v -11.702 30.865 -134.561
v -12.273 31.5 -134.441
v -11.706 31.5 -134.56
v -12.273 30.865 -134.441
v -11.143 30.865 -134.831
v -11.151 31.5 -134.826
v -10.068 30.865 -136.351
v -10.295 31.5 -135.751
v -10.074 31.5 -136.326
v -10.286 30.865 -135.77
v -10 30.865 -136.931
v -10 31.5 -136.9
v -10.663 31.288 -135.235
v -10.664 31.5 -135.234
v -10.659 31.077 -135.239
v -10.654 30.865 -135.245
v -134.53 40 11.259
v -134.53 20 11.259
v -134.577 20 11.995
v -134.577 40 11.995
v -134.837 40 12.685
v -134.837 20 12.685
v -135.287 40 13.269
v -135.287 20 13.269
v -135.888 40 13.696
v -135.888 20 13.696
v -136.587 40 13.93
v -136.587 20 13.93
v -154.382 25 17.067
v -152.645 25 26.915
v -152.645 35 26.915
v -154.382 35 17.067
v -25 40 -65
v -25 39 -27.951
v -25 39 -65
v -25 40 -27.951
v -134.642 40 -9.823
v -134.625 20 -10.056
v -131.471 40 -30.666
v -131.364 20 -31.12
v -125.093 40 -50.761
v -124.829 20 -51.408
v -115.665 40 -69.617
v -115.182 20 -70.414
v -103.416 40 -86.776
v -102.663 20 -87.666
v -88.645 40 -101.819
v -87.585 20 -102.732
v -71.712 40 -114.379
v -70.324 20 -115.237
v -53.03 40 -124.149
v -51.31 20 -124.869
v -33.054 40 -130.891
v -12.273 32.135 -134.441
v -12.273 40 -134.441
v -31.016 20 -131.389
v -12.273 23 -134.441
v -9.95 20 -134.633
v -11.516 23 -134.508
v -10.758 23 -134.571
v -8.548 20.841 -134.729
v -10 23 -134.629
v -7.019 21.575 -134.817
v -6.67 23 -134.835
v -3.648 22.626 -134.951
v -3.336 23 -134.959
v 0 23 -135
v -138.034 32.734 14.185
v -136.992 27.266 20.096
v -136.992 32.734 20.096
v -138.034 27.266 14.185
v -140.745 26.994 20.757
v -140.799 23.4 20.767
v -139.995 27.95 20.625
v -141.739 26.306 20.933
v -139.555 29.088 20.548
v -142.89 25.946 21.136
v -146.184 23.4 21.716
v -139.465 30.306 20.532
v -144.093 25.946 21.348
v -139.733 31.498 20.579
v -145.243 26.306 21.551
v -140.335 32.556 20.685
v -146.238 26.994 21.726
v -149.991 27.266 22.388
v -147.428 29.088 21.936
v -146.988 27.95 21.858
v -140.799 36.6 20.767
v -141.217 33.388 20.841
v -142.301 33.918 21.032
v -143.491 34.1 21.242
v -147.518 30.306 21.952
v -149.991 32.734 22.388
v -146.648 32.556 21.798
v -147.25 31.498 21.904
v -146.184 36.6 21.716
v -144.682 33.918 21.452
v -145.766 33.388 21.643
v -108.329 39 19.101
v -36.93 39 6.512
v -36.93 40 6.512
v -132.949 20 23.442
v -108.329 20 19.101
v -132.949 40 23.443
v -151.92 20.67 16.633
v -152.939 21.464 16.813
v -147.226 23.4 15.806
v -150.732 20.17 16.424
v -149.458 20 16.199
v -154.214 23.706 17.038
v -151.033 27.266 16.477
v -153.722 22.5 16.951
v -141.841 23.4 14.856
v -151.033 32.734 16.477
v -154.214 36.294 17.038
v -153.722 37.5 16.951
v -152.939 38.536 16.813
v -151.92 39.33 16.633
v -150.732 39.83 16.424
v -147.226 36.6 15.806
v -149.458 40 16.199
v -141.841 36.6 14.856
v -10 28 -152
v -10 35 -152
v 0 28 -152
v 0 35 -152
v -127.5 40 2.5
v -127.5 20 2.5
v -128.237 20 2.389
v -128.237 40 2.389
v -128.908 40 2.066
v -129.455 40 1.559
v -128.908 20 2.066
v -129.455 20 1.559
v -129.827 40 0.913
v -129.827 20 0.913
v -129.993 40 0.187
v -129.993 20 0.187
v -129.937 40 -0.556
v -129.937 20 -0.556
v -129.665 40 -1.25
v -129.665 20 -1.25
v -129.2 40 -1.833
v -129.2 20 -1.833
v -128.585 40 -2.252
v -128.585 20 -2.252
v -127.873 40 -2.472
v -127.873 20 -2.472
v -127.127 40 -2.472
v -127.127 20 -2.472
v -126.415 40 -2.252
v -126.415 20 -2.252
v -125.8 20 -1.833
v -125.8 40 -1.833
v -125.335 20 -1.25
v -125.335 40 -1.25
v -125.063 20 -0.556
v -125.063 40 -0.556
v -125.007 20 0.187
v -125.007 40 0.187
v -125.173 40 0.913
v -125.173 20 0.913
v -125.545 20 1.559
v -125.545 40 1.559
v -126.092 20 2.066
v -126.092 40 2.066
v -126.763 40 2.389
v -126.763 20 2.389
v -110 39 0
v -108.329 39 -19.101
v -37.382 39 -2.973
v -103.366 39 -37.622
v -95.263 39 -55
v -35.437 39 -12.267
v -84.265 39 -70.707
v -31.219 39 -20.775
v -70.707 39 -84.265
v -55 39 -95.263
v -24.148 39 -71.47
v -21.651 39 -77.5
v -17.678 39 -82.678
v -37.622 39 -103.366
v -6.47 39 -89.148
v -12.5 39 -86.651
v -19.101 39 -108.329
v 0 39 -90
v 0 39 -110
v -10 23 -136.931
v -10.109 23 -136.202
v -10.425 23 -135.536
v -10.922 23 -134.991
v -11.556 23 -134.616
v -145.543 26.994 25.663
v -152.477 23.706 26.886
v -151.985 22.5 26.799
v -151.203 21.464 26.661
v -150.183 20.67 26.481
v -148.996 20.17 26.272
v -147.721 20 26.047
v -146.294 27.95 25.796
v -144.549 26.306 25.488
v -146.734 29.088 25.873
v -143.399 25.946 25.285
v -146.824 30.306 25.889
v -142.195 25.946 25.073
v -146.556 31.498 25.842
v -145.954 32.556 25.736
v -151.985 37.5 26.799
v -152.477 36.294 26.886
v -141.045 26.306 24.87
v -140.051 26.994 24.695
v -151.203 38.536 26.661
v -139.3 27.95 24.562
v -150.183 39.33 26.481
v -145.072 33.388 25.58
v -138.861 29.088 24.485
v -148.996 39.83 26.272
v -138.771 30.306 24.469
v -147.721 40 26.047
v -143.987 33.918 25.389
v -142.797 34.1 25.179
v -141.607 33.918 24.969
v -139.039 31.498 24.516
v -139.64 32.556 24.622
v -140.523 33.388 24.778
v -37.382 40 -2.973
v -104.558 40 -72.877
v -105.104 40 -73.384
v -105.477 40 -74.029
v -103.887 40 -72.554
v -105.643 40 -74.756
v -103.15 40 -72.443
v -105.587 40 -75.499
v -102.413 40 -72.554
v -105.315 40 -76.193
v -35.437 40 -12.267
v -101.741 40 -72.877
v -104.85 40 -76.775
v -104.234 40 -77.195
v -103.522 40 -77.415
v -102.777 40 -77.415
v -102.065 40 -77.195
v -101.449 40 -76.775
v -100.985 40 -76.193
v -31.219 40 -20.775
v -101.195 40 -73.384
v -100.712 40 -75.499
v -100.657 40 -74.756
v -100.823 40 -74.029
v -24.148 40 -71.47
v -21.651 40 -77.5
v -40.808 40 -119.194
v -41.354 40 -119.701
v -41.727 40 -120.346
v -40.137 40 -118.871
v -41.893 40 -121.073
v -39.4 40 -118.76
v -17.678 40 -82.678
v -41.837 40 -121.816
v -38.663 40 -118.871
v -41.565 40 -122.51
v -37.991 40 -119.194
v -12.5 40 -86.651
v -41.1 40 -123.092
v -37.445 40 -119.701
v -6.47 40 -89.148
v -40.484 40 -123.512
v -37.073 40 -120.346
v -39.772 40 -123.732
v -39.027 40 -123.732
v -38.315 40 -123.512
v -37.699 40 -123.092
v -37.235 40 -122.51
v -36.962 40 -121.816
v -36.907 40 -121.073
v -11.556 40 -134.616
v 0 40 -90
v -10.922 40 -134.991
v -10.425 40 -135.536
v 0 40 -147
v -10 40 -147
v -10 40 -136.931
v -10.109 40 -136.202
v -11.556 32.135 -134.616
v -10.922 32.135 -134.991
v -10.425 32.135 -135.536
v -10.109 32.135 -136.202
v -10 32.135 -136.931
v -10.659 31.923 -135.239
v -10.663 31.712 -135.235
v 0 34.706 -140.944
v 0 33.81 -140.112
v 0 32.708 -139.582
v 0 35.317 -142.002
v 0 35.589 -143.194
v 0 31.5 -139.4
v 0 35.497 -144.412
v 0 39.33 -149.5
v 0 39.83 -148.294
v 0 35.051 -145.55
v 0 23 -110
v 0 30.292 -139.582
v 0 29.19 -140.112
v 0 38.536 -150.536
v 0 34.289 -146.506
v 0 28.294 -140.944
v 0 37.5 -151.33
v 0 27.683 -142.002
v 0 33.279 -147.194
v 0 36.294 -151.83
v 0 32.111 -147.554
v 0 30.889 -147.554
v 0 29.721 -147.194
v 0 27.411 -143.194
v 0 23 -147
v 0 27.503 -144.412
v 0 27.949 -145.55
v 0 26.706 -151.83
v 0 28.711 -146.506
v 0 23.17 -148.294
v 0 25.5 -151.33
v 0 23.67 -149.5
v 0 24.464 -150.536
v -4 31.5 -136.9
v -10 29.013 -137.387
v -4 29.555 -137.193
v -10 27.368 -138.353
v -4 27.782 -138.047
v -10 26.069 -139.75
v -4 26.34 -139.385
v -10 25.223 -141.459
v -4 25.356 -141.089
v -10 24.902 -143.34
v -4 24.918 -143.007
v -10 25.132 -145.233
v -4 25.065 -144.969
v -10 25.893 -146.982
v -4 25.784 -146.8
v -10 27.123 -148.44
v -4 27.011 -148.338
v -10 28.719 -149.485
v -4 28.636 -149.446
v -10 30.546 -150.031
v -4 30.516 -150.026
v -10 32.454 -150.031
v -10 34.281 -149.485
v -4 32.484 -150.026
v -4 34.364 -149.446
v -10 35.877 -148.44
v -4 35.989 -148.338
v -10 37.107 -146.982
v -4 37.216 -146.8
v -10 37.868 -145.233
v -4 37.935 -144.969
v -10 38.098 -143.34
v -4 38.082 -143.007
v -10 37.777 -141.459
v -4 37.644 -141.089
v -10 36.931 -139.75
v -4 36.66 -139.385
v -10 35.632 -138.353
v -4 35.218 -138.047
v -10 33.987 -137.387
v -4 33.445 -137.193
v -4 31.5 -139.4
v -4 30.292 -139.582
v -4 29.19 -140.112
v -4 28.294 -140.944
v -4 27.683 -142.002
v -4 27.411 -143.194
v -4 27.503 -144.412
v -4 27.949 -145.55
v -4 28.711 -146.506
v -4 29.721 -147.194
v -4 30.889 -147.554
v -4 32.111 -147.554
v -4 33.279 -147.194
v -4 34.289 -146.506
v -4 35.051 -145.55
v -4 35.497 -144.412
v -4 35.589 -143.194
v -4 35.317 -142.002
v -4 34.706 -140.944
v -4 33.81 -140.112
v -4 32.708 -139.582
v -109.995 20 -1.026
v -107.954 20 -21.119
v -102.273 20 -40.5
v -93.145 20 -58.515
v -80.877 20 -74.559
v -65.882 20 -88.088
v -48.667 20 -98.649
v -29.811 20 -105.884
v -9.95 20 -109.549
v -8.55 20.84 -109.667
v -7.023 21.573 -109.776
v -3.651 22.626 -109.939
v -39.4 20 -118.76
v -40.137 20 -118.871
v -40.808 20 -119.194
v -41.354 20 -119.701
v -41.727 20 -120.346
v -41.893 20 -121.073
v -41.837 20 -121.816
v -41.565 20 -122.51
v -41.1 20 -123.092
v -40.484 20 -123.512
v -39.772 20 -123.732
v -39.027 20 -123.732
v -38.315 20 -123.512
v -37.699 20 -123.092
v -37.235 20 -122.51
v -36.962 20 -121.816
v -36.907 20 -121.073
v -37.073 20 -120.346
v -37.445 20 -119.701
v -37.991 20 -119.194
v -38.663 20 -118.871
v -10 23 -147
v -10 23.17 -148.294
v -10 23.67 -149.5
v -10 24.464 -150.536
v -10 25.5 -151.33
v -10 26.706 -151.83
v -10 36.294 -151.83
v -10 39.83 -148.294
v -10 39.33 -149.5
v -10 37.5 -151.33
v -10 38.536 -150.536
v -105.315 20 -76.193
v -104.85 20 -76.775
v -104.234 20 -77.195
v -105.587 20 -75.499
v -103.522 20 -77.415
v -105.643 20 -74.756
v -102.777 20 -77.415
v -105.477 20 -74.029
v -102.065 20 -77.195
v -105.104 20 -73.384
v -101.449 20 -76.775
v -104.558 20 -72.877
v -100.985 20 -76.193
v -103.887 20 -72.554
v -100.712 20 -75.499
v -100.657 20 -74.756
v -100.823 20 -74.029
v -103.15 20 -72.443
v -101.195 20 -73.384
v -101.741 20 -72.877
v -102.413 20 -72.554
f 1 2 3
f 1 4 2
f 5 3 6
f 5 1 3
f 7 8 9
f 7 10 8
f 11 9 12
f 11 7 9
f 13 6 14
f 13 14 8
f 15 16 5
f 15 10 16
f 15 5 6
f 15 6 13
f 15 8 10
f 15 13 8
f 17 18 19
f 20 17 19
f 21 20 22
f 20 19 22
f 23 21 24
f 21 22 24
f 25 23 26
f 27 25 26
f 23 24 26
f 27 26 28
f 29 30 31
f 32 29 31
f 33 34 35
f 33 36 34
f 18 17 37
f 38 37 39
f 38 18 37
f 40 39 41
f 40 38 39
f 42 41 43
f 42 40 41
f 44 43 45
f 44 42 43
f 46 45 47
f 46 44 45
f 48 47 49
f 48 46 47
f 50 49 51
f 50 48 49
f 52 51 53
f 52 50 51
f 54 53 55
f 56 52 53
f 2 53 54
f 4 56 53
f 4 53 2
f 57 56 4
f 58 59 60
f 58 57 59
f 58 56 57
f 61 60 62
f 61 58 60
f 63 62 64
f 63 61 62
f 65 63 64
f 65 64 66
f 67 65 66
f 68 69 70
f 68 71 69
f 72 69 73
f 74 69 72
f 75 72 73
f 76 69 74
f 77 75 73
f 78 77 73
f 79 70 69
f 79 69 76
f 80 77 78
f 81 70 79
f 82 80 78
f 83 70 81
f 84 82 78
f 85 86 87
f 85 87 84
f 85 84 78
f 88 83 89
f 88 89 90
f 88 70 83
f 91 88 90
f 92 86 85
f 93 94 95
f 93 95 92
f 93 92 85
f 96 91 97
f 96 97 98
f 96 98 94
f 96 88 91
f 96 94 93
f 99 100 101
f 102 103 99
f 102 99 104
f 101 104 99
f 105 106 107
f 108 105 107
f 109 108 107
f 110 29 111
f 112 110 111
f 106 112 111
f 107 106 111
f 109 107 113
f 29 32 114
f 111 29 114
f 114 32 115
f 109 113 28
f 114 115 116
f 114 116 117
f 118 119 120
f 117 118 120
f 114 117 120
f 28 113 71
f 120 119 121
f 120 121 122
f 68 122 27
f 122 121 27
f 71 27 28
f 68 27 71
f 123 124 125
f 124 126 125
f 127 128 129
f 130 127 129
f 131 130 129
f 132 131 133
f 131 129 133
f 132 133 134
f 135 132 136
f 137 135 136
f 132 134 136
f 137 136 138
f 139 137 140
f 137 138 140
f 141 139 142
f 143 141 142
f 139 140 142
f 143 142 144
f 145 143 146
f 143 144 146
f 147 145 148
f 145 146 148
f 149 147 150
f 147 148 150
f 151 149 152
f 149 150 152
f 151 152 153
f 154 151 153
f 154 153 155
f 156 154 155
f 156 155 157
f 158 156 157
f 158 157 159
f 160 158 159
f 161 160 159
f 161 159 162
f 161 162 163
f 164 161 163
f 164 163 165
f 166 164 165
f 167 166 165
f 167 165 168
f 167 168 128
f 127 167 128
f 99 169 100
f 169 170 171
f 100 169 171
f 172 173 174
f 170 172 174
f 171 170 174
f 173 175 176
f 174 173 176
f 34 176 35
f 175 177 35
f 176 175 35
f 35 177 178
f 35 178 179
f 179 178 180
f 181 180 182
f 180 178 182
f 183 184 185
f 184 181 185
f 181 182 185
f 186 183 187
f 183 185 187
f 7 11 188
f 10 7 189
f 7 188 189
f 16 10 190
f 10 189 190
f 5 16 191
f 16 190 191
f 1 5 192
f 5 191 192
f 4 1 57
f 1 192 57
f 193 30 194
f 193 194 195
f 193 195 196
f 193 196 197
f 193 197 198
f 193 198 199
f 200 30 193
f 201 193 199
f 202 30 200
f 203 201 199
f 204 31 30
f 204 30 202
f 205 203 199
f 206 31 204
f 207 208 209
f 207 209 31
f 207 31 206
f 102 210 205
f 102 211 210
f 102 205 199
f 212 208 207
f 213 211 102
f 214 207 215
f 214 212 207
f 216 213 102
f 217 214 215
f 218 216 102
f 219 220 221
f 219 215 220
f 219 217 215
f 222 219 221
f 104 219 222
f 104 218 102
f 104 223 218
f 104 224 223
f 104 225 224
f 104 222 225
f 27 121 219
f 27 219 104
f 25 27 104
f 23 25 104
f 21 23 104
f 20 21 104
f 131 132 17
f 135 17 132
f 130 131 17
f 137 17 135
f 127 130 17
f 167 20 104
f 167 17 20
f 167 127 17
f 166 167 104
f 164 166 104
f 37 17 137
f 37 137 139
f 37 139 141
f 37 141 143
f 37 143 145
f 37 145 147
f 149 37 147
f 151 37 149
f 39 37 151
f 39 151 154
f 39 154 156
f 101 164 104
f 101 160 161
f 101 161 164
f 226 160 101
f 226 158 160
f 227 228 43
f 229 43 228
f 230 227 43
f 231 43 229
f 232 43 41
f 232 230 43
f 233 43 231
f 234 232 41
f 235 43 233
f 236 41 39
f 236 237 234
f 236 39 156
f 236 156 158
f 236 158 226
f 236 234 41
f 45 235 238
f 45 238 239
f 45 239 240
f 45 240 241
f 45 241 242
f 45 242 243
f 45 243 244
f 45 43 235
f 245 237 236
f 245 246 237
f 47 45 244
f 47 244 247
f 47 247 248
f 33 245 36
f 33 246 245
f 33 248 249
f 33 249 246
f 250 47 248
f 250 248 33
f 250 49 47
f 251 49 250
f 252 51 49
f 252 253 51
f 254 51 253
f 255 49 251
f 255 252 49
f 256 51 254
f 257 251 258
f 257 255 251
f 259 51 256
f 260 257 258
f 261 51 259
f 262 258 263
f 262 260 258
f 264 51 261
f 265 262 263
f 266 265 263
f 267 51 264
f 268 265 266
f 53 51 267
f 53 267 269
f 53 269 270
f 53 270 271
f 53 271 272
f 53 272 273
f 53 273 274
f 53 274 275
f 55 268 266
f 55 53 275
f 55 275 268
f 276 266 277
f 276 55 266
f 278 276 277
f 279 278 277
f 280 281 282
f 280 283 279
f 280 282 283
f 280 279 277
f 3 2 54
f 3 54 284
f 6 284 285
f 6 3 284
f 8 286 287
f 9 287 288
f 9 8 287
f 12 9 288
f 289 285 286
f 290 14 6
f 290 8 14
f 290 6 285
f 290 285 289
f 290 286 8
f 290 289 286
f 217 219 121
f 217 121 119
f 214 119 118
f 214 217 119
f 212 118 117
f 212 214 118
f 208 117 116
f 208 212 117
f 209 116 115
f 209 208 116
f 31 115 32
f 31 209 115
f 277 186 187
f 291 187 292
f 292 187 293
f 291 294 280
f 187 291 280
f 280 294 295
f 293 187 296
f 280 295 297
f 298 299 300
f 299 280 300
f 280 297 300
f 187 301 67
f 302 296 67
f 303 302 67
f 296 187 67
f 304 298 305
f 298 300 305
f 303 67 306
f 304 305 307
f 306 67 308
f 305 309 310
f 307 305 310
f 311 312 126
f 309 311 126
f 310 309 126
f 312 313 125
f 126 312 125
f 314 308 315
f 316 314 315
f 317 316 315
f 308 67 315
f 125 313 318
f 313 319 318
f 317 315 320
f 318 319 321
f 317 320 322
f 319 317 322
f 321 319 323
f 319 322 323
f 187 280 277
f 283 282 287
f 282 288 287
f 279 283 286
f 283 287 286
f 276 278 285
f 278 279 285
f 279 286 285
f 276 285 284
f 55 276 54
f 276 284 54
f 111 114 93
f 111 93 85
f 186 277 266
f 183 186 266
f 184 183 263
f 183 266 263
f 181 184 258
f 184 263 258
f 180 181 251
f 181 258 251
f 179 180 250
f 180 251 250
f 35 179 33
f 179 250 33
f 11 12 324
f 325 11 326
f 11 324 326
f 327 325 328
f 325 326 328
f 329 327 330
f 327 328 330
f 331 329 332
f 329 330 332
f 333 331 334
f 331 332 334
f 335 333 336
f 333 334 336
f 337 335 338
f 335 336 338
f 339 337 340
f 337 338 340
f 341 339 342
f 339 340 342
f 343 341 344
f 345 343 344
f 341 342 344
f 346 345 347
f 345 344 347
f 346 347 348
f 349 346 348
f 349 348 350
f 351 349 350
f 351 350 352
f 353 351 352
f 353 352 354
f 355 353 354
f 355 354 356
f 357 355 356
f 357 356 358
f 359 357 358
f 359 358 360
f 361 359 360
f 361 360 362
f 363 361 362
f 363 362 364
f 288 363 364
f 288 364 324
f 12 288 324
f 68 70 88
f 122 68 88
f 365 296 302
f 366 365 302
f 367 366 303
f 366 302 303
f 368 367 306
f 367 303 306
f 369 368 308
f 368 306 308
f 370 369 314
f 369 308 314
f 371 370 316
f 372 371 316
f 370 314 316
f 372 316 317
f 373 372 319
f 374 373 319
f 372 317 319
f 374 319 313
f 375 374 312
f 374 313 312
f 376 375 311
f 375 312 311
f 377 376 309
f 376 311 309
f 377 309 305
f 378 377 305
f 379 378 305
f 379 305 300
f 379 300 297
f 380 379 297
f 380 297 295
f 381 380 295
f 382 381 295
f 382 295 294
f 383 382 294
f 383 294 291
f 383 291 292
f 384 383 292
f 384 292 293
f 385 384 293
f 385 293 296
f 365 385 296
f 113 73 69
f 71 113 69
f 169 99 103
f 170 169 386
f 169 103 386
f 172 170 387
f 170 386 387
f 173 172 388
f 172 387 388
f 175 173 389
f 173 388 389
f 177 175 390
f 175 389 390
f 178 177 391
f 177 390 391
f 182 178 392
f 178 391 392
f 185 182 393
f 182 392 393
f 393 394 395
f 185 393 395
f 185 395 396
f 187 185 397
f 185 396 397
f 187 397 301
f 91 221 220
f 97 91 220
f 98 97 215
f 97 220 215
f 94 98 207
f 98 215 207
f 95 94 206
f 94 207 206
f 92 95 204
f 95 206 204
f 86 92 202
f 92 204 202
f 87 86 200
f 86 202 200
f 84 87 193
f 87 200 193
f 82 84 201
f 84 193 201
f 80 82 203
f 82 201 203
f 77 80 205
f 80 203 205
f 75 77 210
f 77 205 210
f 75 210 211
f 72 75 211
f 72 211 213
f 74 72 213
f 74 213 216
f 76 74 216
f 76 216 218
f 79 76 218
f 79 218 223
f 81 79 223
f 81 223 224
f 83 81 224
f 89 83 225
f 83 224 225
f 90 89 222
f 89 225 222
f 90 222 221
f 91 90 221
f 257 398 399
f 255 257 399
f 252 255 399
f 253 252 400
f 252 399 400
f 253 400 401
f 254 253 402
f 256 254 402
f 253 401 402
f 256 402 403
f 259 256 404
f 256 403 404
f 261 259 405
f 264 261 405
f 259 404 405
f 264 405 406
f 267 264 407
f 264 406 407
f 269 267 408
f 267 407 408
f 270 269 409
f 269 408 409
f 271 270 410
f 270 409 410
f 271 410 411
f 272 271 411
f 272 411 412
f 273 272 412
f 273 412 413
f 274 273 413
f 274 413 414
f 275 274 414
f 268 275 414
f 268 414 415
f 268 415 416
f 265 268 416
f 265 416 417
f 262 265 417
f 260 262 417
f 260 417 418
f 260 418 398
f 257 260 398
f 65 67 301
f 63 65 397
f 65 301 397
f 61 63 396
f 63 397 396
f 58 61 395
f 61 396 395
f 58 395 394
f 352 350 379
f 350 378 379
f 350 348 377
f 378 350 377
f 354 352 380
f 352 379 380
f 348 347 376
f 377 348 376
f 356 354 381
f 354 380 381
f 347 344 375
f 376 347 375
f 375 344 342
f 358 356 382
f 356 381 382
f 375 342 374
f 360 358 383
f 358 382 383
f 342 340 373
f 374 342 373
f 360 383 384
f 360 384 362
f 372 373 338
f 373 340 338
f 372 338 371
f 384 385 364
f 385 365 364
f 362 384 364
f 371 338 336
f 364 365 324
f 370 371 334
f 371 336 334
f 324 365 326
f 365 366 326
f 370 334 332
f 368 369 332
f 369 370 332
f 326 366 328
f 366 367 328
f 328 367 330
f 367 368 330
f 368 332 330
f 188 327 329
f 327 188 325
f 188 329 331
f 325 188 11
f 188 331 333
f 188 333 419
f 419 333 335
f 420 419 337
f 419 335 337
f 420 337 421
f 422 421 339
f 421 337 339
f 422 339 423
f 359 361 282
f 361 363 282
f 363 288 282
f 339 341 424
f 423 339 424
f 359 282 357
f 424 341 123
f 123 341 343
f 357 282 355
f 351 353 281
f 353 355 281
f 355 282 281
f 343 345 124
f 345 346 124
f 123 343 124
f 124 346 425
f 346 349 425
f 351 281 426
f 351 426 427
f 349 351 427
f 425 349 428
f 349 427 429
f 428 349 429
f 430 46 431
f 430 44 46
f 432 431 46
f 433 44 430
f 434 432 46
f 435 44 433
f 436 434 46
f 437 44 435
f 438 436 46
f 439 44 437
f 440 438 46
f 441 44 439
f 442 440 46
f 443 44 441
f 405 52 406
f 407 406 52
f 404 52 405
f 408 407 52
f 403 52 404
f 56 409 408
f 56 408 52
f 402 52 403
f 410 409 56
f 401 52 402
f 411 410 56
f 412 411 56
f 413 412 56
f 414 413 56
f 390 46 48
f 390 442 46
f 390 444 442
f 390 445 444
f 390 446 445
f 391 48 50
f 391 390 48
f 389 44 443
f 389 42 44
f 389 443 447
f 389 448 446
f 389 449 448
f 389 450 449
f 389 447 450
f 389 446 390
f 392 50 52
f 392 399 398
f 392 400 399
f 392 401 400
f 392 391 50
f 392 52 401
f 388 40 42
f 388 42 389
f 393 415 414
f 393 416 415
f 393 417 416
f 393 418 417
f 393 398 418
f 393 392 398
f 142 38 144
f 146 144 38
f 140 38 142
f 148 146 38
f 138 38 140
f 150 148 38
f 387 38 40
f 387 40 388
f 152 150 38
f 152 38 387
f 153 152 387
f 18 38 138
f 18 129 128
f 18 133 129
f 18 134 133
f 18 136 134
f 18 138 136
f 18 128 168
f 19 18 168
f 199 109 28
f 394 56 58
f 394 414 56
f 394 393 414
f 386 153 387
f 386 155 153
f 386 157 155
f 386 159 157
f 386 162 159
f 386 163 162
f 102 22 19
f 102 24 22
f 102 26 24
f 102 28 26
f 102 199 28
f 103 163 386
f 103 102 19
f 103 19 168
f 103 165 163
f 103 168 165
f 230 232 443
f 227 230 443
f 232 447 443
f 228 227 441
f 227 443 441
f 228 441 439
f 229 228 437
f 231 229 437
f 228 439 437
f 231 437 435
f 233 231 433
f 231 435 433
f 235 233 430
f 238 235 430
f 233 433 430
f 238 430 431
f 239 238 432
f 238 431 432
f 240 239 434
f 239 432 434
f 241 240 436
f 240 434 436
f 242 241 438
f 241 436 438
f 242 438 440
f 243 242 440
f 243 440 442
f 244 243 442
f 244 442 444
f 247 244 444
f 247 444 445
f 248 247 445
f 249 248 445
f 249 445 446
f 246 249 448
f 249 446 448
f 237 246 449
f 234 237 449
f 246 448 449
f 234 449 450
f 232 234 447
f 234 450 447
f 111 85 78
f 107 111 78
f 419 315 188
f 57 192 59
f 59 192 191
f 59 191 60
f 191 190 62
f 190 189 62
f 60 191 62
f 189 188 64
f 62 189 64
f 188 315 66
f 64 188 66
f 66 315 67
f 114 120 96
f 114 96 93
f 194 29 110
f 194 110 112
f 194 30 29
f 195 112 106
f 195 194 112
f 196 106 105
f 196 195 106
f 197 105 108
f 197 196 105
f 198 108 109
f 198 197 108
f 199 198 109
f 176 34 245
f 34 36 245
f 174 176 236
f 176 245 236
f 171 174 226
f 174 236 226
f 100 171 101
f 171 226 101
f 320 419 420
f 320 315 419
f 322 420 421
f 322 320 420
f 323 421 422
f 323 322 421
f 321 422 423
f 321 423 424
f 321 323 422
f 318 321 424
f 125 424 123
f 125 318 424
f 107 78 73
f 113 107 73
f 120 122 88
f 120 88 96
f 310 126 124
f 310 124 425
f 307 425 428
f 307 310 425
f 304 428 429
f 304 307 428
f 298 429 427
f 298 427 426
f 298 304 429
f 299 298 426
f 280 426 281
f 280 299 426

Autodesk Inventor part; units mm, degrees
ref_plane "YZ Plane" through (0, 0, 0) normal (1, 0, 0) x (0, 1, 0)
ref_plane "XZ Plane" through (0, 0, 0) normal (0, 1, 0) x (-1, 0, 0)
ref_plane "XY Plane" through (0, 0, 0) normal (0, 0, 1) x (1, 0, 0)
sketch "Sketch1" plane through (0, 0, 0) normal (0, 1, 0) x (-1, 0, 0)
  circle A0 centre (0, 0) radius 135
  circle A1 centre (0, 0) radius 110
  dimension "d0" = 270
  dimension "d1" = 220
extrude "Extrusion1" add sketch "Sketch1" along normal blind 55
sketch "Sketch2" plane through (0, 0, 0) normal (0, 0, 1) x (1, 0, 0)
  circle A0 centre (0, 5) radius 18
  line L0 (135, 0) -> (-135, 0) projected
  point P0 (0, 0)
  dimension "d4" = 36
  dimension "d5" = 5
extrude "Extrusion2" cut sketch "Sketch2" against normal through all
sketch "Sketch3" plane through (0, 0, 0) normal (0, -1, 0) x (1, 0, 0)
  circle A0 centre (0, 0) radius 140
extrude "Extrusion3" cut sketch "Sketch3" against normal blind 20
sketch "Sketch4" plane through (0, 20, 0) normal (0, -1, 0) x (1, 0, 0)
  line L0 (0, 0) -> (70, 0)
  line L1 (80, -100) -> (60, -100)
  line L2 (60, -100) -> (60, 100)
  line L3 (60, 100) -> (80, 100)
  line L4 (80, 100) -> (80, -100)
  line L5 (80, -100) -> (60, 100) construction
  line L6 (60, -100) -> (80, 100) construction
  dimension "d10" = 70
  dimension "d11" = 20
  dimension "d12" = 200
extrude "Extrusion4" cut sketch "Sketch4" against normal through all
sketch "Sketch5" plane through (0, 55, 0) normal (0, 1, 0) x (1, 0, 0)
  circle A0 centre (0, 0) radius 127.5
  circle A1 centre (127.5, 0) radius 2
  circle A2 centre (103.1497, 74.9426) radius 2
  circle A3 centre (39.3997, 121.2597) radius 2
  circle A4 centre (-39.3997, 121.2597) radius 2
  circle A5 centre (-103.1497, 74.9426) radius 2
  circle A6 centre (-127.5, 0) radius 2
  circle A7 centre (-103.1497, -74.9426) radius 2
  circle A8 centre (-39.3997, -121.2597) radius 2
  circle A9 centre (39.3997, -121.2597) radius 2
  circle A10 centre (103.1497, -74.9426) radius 2
  dimension "d15" = 255
  dimension "d16" = 4
  dimension "d19" = 360
hole "Hole1" at (127.5, 55, 0) at (103.1497, 55, 74.9426) at (39.3997, 55, 121.2597) at (-39.3997, 55, 121.2597) at (-103.1497, 55, 74.9426) at (-127.5, 55, 0) at (-103.1497, 55, -74.9426) at (-39.3997, 55, -121.2597) at (39.3997, 55, -121.2597) at (103.1497, 55, -74.9426) direction (0, -1, 0) diameter 5 end through all
sketch "Sketch6" plane through (0, 55, 0) normal (0, 1, 0) x (1, 0, 0)
  circle A0 centre (0, 0) radius 140
extrude "Extrusion5" cut sketch "Sketch6" against normal blind 15
sketch "Sketch7" plane through (0, 40, 0) normal (0, 1, 0) x (1, 0, 0)
  circle A0 centre (0, 0) radius 140
  line L0 (80, -100) -> (80, -75.4983) projected
  line L1 (80, -100) -> (80, -75.4983)
  line L2 (60, -100) -> (80, -100) projected
  line L3 (80, -100) -> (60, -100)
  line L4 (60, -100) -> (60, -92.1954)
  line L5 (60, 100) -> (60, 92.1954) projected
  line L6 (60, 92.1954) -> (60, 100)
  line L7 (60, 100) -> (80, 100)
  line L8 (80, 100) -> (80, 75.4983)
  arc A1 (80, -75.4983) -> (80, 75.4983) centre (0, 0) ccw
  arc A2 (60, 92.1954) -> (60, -92.1954) centre (0, 0) ccw
  arc A3 (-25, -65) -> (25, -65) centre (0, -65) ccw
  arc A4 (25, 65) -> (-25, 65) centre (0, 65) ccw
  arc A5 (25, -27.9508) -> (25, 27.9508) centre (0, 0) ccw
  arc A6 (-25, 27.9508) -> (-25, -27.9508) centre (0, 0) ccw
  line L9 (25, 65) -> (25, 27.9508)
  line L10 (25, -27.9508) -> (25, -65)
  line L11 (-25, -65) -> (-25, -27.9508)
  line L12 (-25, 27.9508) -> (-25, 65)
extrude "Extrusion6" add sketch "Sketch7" against normal blind 1 contours L2 L4 A2 L5 L7 L8 A1 L0
sketch "Sketch8" plane through (0, 39, 0) normal (0, -1, 0) x (1, 0, 0)
  line L0 (80, -75.4983) -> (80, -100) projected
  line L1 (80, -100) -> (60, -100)
  line L2 (60, -100) -> (60, 100)
  line L3 (60, 100) -> (80, 100)
  line L4 (80, 100) -> (80, 75.4983)
  line L5 (80, -75.4983) -> (80, -100)
  arc A0 (80, -75.4983) -> (80, 75.4983) centre (0, 0) ccw
  arc A1 (60, 92.1954) -> (60, -92.1954) centre (0, 0) ccw
extrude "Extrusion7" add sketch "Sketch8" along normal blind 14 contours L0 L1 L2 L3 L4 A0
sketch "Sketch9" plane through (0, 20, 0) normal (0, -1, 0) x (1, 0, 0)
  arc A0 (9.9499, -134.6328) -> (-9.9499, -134.6328) centre (0, 0) ccw projected
  spline S0 degree 7 poles (9.9499, -134.6328) (9.4556, -134.6694) (8.9421, -134.7052) (8.4096, -134.74) (7.8582, -134.7735) (7.2882, -134.8052) (6.6998, -134.835) (5.2633, -134.8999) (4.3998, -134.933) (3.5087, -134.9604) (2.5962, -134.9814) (1.6691, -134.9951) (0.7345, -135.0012) (-1.7136, -134.9976) (-3.2083, -134.9756) (-4.6621, -134.9347) (-6.0536, -134.8776) (-7.364, -134.8084) (-8.5782, -134.7318) (-9.7236, -134.6494) (-9.7616, -134.6466) (-9.7995, -134.6439) (-9.8372, -134.6411) (-9.8749, -134.6384) (-9.9124, -134.6356) (-9.9499, -134.6328) knots 0 0 0 0 0 0 0 0 0.214533 0.214533 0.214533 0.214533 0.214533 0.214533 0.508291 0.508291 0.508291 0.508291 0.508291 0.508291 0.983641 0.983641 0.983641 0.983641 0.983641 0.983641 1 1 1 1 1 1 1 1 projected
  line L0 (0, 135) -> (0, -135)
  line L1 (132.949, -23.4425) -> (-132.949, 23.4425)
  point P0 (0, 0)
  dimension "d40" = 80
extrude "Extrusion8" cut sketch "Sketch9" against normal through all contours S0 L0 L1 A0 | L1 L0 A0 | L0 L1 A0 picked at (74.3823, -50.3789)
sketch "Sketch10" plane through (0, 23, -135) normal (1, 0, 0) x (0, 0, -1)
  line L0 (-45, 17) -> (0, 17) projected
  line L1 (-2.5, 17) -> (12, 17)
  line L2 (17, 12) -> (17, 5)
  line L3 (12, 0) -> (-2.5, 0)
  line L4 (-2.5, 0) -> (-2.5, 17)
  line L5 (0, 17) -> (0, 0) projected
  arc A0 (17, 12) -> (12, 17) centre (12, 12) ccw
  arc A1 (12, 0) -> (17, 5) centre (12, 5) ccw
  point P0 (-135, -23)
  point P1 (17, 0)
  point P2 (17, 17)
  dimension "d43" = 19.5
  dimension "d44" = 17
  dimension "d45" = 17
  dimension "d46" = 5
extrude "Extrusion9" add sketch "Sketch10" against normal blind 10
sketch "Sketch11" plane through (-10, 23, -135) normal (-1, 0, 0) x (0, 0, 1)
  line L0 (0.3709, 17) -> (-12, 17) projected
  line L1 (-17, 12) -> (-17, 5) projected
  point P0 (135, -23)
  point P1 (-8.5, 8.5)
  dimension "d49" = 8.5
  dimension "d50" = 8.5
hole "Hole2" at (-10, 31.5, -143.5) direction (1, 0, 0) diameter 8.2 end through all counterbore diameter 13.2 counterbore depth 6
sketch "Sketch12" plane through (-132.949, 20, 23.4425) normal (0.1736482, 0, 0.9848078) x (0.9848078, 0, -0.1736482)
  line L0 (25, 0) -> (0, 0) projected
  line L1 (2.5, 0) -> (-15, 0)
  line L2 (-20, 5) -> (-20, 15)
  line L3 (-15, 20) -> (2.5, 20)
  line L4 (2.5, 20) -> (2.5, 0)
  line L5 (0, 0) -> (0, 20) projected
  arc A0 (-15, 20) -> (-20, 15) centre (-15, 15) ccw
  arc A1 (-20, 5) -> (-15, 0) centre (-15, 5) ccw
  point P0 (135, -20)
  point P1 (-20, 20)
  point P2 (-20, 0)
  dimension "d59" = 22.5
  dimension "d60" = 20
  dimension "d61" = 20
  dimension "d62" = 5
extrude "Extrusion10" add sketch "Sketch12" against normal blind 10
sketch "Sketch13" plane through (-134.6855, 20, 13.5944) normal (-0.1736482, 0, -0.9848078) x (-0.9848078, 0, 0.1736482)
  line L0 (7.2662, 16.6) -> (12.7338, 16.6)
  line L1 (12.7338, 16.6) -> (16.6, 12.7338)
  line L2 (16.6, 12.7338) -> (16.6, 7.2662)
  line L3 (16.6, 7.2662) -> (12.7338, 3.4)
  line L4 (12.7338, 3.4) -> (7.2662, 3.4)
  line L5 (7.2662, 3.4) -> (3.4, 7.2662)
  line L6 (3.4, 7.2662) -> (3.4, 12.7338)
  line L7 (3.4, 12.7338) -> (7.2662, 16.6)
  line L8 (20, 5) -> (20, 15) projected
  line L9 (15, 20) -> (-0.3709, 20) projected
  point P0 (-135, -20)
  point P1 (10, 10)
  dimension "d65" = 10
  dimension "d66" = 10
  dimension "d67" = 13.2
extrude "Extrusion11" cut sketch "Sketch13" against normal blind 6
sketch "Sketch14" plane through (-133.6436, 20, 19.5033) normal (-0.1736482, 0, -0.9848078) x (-0.9848078, 0, 0.1736482)
  line L0 (20, 5) -> (20, 15) projected
  line L1 (15, 20) -> (-0.3709, 20) projected
  point P0 (-135, -20)
  point P1 (10, 10)
  dimension "d70" = 10
  dimension "d71" = 10
hole "Hole3" at (-143.4917, 30, 21.2398) direction (0.1736482, 0, 0.9848078) diameter 8.2 end through all
fillet "Fillet2" radius 2.5 2 edges at (-10, 31.5, -134.6291) (-134.3203, 30, 13.53)
properties part number "Cylinder Spacer Top_Q"
